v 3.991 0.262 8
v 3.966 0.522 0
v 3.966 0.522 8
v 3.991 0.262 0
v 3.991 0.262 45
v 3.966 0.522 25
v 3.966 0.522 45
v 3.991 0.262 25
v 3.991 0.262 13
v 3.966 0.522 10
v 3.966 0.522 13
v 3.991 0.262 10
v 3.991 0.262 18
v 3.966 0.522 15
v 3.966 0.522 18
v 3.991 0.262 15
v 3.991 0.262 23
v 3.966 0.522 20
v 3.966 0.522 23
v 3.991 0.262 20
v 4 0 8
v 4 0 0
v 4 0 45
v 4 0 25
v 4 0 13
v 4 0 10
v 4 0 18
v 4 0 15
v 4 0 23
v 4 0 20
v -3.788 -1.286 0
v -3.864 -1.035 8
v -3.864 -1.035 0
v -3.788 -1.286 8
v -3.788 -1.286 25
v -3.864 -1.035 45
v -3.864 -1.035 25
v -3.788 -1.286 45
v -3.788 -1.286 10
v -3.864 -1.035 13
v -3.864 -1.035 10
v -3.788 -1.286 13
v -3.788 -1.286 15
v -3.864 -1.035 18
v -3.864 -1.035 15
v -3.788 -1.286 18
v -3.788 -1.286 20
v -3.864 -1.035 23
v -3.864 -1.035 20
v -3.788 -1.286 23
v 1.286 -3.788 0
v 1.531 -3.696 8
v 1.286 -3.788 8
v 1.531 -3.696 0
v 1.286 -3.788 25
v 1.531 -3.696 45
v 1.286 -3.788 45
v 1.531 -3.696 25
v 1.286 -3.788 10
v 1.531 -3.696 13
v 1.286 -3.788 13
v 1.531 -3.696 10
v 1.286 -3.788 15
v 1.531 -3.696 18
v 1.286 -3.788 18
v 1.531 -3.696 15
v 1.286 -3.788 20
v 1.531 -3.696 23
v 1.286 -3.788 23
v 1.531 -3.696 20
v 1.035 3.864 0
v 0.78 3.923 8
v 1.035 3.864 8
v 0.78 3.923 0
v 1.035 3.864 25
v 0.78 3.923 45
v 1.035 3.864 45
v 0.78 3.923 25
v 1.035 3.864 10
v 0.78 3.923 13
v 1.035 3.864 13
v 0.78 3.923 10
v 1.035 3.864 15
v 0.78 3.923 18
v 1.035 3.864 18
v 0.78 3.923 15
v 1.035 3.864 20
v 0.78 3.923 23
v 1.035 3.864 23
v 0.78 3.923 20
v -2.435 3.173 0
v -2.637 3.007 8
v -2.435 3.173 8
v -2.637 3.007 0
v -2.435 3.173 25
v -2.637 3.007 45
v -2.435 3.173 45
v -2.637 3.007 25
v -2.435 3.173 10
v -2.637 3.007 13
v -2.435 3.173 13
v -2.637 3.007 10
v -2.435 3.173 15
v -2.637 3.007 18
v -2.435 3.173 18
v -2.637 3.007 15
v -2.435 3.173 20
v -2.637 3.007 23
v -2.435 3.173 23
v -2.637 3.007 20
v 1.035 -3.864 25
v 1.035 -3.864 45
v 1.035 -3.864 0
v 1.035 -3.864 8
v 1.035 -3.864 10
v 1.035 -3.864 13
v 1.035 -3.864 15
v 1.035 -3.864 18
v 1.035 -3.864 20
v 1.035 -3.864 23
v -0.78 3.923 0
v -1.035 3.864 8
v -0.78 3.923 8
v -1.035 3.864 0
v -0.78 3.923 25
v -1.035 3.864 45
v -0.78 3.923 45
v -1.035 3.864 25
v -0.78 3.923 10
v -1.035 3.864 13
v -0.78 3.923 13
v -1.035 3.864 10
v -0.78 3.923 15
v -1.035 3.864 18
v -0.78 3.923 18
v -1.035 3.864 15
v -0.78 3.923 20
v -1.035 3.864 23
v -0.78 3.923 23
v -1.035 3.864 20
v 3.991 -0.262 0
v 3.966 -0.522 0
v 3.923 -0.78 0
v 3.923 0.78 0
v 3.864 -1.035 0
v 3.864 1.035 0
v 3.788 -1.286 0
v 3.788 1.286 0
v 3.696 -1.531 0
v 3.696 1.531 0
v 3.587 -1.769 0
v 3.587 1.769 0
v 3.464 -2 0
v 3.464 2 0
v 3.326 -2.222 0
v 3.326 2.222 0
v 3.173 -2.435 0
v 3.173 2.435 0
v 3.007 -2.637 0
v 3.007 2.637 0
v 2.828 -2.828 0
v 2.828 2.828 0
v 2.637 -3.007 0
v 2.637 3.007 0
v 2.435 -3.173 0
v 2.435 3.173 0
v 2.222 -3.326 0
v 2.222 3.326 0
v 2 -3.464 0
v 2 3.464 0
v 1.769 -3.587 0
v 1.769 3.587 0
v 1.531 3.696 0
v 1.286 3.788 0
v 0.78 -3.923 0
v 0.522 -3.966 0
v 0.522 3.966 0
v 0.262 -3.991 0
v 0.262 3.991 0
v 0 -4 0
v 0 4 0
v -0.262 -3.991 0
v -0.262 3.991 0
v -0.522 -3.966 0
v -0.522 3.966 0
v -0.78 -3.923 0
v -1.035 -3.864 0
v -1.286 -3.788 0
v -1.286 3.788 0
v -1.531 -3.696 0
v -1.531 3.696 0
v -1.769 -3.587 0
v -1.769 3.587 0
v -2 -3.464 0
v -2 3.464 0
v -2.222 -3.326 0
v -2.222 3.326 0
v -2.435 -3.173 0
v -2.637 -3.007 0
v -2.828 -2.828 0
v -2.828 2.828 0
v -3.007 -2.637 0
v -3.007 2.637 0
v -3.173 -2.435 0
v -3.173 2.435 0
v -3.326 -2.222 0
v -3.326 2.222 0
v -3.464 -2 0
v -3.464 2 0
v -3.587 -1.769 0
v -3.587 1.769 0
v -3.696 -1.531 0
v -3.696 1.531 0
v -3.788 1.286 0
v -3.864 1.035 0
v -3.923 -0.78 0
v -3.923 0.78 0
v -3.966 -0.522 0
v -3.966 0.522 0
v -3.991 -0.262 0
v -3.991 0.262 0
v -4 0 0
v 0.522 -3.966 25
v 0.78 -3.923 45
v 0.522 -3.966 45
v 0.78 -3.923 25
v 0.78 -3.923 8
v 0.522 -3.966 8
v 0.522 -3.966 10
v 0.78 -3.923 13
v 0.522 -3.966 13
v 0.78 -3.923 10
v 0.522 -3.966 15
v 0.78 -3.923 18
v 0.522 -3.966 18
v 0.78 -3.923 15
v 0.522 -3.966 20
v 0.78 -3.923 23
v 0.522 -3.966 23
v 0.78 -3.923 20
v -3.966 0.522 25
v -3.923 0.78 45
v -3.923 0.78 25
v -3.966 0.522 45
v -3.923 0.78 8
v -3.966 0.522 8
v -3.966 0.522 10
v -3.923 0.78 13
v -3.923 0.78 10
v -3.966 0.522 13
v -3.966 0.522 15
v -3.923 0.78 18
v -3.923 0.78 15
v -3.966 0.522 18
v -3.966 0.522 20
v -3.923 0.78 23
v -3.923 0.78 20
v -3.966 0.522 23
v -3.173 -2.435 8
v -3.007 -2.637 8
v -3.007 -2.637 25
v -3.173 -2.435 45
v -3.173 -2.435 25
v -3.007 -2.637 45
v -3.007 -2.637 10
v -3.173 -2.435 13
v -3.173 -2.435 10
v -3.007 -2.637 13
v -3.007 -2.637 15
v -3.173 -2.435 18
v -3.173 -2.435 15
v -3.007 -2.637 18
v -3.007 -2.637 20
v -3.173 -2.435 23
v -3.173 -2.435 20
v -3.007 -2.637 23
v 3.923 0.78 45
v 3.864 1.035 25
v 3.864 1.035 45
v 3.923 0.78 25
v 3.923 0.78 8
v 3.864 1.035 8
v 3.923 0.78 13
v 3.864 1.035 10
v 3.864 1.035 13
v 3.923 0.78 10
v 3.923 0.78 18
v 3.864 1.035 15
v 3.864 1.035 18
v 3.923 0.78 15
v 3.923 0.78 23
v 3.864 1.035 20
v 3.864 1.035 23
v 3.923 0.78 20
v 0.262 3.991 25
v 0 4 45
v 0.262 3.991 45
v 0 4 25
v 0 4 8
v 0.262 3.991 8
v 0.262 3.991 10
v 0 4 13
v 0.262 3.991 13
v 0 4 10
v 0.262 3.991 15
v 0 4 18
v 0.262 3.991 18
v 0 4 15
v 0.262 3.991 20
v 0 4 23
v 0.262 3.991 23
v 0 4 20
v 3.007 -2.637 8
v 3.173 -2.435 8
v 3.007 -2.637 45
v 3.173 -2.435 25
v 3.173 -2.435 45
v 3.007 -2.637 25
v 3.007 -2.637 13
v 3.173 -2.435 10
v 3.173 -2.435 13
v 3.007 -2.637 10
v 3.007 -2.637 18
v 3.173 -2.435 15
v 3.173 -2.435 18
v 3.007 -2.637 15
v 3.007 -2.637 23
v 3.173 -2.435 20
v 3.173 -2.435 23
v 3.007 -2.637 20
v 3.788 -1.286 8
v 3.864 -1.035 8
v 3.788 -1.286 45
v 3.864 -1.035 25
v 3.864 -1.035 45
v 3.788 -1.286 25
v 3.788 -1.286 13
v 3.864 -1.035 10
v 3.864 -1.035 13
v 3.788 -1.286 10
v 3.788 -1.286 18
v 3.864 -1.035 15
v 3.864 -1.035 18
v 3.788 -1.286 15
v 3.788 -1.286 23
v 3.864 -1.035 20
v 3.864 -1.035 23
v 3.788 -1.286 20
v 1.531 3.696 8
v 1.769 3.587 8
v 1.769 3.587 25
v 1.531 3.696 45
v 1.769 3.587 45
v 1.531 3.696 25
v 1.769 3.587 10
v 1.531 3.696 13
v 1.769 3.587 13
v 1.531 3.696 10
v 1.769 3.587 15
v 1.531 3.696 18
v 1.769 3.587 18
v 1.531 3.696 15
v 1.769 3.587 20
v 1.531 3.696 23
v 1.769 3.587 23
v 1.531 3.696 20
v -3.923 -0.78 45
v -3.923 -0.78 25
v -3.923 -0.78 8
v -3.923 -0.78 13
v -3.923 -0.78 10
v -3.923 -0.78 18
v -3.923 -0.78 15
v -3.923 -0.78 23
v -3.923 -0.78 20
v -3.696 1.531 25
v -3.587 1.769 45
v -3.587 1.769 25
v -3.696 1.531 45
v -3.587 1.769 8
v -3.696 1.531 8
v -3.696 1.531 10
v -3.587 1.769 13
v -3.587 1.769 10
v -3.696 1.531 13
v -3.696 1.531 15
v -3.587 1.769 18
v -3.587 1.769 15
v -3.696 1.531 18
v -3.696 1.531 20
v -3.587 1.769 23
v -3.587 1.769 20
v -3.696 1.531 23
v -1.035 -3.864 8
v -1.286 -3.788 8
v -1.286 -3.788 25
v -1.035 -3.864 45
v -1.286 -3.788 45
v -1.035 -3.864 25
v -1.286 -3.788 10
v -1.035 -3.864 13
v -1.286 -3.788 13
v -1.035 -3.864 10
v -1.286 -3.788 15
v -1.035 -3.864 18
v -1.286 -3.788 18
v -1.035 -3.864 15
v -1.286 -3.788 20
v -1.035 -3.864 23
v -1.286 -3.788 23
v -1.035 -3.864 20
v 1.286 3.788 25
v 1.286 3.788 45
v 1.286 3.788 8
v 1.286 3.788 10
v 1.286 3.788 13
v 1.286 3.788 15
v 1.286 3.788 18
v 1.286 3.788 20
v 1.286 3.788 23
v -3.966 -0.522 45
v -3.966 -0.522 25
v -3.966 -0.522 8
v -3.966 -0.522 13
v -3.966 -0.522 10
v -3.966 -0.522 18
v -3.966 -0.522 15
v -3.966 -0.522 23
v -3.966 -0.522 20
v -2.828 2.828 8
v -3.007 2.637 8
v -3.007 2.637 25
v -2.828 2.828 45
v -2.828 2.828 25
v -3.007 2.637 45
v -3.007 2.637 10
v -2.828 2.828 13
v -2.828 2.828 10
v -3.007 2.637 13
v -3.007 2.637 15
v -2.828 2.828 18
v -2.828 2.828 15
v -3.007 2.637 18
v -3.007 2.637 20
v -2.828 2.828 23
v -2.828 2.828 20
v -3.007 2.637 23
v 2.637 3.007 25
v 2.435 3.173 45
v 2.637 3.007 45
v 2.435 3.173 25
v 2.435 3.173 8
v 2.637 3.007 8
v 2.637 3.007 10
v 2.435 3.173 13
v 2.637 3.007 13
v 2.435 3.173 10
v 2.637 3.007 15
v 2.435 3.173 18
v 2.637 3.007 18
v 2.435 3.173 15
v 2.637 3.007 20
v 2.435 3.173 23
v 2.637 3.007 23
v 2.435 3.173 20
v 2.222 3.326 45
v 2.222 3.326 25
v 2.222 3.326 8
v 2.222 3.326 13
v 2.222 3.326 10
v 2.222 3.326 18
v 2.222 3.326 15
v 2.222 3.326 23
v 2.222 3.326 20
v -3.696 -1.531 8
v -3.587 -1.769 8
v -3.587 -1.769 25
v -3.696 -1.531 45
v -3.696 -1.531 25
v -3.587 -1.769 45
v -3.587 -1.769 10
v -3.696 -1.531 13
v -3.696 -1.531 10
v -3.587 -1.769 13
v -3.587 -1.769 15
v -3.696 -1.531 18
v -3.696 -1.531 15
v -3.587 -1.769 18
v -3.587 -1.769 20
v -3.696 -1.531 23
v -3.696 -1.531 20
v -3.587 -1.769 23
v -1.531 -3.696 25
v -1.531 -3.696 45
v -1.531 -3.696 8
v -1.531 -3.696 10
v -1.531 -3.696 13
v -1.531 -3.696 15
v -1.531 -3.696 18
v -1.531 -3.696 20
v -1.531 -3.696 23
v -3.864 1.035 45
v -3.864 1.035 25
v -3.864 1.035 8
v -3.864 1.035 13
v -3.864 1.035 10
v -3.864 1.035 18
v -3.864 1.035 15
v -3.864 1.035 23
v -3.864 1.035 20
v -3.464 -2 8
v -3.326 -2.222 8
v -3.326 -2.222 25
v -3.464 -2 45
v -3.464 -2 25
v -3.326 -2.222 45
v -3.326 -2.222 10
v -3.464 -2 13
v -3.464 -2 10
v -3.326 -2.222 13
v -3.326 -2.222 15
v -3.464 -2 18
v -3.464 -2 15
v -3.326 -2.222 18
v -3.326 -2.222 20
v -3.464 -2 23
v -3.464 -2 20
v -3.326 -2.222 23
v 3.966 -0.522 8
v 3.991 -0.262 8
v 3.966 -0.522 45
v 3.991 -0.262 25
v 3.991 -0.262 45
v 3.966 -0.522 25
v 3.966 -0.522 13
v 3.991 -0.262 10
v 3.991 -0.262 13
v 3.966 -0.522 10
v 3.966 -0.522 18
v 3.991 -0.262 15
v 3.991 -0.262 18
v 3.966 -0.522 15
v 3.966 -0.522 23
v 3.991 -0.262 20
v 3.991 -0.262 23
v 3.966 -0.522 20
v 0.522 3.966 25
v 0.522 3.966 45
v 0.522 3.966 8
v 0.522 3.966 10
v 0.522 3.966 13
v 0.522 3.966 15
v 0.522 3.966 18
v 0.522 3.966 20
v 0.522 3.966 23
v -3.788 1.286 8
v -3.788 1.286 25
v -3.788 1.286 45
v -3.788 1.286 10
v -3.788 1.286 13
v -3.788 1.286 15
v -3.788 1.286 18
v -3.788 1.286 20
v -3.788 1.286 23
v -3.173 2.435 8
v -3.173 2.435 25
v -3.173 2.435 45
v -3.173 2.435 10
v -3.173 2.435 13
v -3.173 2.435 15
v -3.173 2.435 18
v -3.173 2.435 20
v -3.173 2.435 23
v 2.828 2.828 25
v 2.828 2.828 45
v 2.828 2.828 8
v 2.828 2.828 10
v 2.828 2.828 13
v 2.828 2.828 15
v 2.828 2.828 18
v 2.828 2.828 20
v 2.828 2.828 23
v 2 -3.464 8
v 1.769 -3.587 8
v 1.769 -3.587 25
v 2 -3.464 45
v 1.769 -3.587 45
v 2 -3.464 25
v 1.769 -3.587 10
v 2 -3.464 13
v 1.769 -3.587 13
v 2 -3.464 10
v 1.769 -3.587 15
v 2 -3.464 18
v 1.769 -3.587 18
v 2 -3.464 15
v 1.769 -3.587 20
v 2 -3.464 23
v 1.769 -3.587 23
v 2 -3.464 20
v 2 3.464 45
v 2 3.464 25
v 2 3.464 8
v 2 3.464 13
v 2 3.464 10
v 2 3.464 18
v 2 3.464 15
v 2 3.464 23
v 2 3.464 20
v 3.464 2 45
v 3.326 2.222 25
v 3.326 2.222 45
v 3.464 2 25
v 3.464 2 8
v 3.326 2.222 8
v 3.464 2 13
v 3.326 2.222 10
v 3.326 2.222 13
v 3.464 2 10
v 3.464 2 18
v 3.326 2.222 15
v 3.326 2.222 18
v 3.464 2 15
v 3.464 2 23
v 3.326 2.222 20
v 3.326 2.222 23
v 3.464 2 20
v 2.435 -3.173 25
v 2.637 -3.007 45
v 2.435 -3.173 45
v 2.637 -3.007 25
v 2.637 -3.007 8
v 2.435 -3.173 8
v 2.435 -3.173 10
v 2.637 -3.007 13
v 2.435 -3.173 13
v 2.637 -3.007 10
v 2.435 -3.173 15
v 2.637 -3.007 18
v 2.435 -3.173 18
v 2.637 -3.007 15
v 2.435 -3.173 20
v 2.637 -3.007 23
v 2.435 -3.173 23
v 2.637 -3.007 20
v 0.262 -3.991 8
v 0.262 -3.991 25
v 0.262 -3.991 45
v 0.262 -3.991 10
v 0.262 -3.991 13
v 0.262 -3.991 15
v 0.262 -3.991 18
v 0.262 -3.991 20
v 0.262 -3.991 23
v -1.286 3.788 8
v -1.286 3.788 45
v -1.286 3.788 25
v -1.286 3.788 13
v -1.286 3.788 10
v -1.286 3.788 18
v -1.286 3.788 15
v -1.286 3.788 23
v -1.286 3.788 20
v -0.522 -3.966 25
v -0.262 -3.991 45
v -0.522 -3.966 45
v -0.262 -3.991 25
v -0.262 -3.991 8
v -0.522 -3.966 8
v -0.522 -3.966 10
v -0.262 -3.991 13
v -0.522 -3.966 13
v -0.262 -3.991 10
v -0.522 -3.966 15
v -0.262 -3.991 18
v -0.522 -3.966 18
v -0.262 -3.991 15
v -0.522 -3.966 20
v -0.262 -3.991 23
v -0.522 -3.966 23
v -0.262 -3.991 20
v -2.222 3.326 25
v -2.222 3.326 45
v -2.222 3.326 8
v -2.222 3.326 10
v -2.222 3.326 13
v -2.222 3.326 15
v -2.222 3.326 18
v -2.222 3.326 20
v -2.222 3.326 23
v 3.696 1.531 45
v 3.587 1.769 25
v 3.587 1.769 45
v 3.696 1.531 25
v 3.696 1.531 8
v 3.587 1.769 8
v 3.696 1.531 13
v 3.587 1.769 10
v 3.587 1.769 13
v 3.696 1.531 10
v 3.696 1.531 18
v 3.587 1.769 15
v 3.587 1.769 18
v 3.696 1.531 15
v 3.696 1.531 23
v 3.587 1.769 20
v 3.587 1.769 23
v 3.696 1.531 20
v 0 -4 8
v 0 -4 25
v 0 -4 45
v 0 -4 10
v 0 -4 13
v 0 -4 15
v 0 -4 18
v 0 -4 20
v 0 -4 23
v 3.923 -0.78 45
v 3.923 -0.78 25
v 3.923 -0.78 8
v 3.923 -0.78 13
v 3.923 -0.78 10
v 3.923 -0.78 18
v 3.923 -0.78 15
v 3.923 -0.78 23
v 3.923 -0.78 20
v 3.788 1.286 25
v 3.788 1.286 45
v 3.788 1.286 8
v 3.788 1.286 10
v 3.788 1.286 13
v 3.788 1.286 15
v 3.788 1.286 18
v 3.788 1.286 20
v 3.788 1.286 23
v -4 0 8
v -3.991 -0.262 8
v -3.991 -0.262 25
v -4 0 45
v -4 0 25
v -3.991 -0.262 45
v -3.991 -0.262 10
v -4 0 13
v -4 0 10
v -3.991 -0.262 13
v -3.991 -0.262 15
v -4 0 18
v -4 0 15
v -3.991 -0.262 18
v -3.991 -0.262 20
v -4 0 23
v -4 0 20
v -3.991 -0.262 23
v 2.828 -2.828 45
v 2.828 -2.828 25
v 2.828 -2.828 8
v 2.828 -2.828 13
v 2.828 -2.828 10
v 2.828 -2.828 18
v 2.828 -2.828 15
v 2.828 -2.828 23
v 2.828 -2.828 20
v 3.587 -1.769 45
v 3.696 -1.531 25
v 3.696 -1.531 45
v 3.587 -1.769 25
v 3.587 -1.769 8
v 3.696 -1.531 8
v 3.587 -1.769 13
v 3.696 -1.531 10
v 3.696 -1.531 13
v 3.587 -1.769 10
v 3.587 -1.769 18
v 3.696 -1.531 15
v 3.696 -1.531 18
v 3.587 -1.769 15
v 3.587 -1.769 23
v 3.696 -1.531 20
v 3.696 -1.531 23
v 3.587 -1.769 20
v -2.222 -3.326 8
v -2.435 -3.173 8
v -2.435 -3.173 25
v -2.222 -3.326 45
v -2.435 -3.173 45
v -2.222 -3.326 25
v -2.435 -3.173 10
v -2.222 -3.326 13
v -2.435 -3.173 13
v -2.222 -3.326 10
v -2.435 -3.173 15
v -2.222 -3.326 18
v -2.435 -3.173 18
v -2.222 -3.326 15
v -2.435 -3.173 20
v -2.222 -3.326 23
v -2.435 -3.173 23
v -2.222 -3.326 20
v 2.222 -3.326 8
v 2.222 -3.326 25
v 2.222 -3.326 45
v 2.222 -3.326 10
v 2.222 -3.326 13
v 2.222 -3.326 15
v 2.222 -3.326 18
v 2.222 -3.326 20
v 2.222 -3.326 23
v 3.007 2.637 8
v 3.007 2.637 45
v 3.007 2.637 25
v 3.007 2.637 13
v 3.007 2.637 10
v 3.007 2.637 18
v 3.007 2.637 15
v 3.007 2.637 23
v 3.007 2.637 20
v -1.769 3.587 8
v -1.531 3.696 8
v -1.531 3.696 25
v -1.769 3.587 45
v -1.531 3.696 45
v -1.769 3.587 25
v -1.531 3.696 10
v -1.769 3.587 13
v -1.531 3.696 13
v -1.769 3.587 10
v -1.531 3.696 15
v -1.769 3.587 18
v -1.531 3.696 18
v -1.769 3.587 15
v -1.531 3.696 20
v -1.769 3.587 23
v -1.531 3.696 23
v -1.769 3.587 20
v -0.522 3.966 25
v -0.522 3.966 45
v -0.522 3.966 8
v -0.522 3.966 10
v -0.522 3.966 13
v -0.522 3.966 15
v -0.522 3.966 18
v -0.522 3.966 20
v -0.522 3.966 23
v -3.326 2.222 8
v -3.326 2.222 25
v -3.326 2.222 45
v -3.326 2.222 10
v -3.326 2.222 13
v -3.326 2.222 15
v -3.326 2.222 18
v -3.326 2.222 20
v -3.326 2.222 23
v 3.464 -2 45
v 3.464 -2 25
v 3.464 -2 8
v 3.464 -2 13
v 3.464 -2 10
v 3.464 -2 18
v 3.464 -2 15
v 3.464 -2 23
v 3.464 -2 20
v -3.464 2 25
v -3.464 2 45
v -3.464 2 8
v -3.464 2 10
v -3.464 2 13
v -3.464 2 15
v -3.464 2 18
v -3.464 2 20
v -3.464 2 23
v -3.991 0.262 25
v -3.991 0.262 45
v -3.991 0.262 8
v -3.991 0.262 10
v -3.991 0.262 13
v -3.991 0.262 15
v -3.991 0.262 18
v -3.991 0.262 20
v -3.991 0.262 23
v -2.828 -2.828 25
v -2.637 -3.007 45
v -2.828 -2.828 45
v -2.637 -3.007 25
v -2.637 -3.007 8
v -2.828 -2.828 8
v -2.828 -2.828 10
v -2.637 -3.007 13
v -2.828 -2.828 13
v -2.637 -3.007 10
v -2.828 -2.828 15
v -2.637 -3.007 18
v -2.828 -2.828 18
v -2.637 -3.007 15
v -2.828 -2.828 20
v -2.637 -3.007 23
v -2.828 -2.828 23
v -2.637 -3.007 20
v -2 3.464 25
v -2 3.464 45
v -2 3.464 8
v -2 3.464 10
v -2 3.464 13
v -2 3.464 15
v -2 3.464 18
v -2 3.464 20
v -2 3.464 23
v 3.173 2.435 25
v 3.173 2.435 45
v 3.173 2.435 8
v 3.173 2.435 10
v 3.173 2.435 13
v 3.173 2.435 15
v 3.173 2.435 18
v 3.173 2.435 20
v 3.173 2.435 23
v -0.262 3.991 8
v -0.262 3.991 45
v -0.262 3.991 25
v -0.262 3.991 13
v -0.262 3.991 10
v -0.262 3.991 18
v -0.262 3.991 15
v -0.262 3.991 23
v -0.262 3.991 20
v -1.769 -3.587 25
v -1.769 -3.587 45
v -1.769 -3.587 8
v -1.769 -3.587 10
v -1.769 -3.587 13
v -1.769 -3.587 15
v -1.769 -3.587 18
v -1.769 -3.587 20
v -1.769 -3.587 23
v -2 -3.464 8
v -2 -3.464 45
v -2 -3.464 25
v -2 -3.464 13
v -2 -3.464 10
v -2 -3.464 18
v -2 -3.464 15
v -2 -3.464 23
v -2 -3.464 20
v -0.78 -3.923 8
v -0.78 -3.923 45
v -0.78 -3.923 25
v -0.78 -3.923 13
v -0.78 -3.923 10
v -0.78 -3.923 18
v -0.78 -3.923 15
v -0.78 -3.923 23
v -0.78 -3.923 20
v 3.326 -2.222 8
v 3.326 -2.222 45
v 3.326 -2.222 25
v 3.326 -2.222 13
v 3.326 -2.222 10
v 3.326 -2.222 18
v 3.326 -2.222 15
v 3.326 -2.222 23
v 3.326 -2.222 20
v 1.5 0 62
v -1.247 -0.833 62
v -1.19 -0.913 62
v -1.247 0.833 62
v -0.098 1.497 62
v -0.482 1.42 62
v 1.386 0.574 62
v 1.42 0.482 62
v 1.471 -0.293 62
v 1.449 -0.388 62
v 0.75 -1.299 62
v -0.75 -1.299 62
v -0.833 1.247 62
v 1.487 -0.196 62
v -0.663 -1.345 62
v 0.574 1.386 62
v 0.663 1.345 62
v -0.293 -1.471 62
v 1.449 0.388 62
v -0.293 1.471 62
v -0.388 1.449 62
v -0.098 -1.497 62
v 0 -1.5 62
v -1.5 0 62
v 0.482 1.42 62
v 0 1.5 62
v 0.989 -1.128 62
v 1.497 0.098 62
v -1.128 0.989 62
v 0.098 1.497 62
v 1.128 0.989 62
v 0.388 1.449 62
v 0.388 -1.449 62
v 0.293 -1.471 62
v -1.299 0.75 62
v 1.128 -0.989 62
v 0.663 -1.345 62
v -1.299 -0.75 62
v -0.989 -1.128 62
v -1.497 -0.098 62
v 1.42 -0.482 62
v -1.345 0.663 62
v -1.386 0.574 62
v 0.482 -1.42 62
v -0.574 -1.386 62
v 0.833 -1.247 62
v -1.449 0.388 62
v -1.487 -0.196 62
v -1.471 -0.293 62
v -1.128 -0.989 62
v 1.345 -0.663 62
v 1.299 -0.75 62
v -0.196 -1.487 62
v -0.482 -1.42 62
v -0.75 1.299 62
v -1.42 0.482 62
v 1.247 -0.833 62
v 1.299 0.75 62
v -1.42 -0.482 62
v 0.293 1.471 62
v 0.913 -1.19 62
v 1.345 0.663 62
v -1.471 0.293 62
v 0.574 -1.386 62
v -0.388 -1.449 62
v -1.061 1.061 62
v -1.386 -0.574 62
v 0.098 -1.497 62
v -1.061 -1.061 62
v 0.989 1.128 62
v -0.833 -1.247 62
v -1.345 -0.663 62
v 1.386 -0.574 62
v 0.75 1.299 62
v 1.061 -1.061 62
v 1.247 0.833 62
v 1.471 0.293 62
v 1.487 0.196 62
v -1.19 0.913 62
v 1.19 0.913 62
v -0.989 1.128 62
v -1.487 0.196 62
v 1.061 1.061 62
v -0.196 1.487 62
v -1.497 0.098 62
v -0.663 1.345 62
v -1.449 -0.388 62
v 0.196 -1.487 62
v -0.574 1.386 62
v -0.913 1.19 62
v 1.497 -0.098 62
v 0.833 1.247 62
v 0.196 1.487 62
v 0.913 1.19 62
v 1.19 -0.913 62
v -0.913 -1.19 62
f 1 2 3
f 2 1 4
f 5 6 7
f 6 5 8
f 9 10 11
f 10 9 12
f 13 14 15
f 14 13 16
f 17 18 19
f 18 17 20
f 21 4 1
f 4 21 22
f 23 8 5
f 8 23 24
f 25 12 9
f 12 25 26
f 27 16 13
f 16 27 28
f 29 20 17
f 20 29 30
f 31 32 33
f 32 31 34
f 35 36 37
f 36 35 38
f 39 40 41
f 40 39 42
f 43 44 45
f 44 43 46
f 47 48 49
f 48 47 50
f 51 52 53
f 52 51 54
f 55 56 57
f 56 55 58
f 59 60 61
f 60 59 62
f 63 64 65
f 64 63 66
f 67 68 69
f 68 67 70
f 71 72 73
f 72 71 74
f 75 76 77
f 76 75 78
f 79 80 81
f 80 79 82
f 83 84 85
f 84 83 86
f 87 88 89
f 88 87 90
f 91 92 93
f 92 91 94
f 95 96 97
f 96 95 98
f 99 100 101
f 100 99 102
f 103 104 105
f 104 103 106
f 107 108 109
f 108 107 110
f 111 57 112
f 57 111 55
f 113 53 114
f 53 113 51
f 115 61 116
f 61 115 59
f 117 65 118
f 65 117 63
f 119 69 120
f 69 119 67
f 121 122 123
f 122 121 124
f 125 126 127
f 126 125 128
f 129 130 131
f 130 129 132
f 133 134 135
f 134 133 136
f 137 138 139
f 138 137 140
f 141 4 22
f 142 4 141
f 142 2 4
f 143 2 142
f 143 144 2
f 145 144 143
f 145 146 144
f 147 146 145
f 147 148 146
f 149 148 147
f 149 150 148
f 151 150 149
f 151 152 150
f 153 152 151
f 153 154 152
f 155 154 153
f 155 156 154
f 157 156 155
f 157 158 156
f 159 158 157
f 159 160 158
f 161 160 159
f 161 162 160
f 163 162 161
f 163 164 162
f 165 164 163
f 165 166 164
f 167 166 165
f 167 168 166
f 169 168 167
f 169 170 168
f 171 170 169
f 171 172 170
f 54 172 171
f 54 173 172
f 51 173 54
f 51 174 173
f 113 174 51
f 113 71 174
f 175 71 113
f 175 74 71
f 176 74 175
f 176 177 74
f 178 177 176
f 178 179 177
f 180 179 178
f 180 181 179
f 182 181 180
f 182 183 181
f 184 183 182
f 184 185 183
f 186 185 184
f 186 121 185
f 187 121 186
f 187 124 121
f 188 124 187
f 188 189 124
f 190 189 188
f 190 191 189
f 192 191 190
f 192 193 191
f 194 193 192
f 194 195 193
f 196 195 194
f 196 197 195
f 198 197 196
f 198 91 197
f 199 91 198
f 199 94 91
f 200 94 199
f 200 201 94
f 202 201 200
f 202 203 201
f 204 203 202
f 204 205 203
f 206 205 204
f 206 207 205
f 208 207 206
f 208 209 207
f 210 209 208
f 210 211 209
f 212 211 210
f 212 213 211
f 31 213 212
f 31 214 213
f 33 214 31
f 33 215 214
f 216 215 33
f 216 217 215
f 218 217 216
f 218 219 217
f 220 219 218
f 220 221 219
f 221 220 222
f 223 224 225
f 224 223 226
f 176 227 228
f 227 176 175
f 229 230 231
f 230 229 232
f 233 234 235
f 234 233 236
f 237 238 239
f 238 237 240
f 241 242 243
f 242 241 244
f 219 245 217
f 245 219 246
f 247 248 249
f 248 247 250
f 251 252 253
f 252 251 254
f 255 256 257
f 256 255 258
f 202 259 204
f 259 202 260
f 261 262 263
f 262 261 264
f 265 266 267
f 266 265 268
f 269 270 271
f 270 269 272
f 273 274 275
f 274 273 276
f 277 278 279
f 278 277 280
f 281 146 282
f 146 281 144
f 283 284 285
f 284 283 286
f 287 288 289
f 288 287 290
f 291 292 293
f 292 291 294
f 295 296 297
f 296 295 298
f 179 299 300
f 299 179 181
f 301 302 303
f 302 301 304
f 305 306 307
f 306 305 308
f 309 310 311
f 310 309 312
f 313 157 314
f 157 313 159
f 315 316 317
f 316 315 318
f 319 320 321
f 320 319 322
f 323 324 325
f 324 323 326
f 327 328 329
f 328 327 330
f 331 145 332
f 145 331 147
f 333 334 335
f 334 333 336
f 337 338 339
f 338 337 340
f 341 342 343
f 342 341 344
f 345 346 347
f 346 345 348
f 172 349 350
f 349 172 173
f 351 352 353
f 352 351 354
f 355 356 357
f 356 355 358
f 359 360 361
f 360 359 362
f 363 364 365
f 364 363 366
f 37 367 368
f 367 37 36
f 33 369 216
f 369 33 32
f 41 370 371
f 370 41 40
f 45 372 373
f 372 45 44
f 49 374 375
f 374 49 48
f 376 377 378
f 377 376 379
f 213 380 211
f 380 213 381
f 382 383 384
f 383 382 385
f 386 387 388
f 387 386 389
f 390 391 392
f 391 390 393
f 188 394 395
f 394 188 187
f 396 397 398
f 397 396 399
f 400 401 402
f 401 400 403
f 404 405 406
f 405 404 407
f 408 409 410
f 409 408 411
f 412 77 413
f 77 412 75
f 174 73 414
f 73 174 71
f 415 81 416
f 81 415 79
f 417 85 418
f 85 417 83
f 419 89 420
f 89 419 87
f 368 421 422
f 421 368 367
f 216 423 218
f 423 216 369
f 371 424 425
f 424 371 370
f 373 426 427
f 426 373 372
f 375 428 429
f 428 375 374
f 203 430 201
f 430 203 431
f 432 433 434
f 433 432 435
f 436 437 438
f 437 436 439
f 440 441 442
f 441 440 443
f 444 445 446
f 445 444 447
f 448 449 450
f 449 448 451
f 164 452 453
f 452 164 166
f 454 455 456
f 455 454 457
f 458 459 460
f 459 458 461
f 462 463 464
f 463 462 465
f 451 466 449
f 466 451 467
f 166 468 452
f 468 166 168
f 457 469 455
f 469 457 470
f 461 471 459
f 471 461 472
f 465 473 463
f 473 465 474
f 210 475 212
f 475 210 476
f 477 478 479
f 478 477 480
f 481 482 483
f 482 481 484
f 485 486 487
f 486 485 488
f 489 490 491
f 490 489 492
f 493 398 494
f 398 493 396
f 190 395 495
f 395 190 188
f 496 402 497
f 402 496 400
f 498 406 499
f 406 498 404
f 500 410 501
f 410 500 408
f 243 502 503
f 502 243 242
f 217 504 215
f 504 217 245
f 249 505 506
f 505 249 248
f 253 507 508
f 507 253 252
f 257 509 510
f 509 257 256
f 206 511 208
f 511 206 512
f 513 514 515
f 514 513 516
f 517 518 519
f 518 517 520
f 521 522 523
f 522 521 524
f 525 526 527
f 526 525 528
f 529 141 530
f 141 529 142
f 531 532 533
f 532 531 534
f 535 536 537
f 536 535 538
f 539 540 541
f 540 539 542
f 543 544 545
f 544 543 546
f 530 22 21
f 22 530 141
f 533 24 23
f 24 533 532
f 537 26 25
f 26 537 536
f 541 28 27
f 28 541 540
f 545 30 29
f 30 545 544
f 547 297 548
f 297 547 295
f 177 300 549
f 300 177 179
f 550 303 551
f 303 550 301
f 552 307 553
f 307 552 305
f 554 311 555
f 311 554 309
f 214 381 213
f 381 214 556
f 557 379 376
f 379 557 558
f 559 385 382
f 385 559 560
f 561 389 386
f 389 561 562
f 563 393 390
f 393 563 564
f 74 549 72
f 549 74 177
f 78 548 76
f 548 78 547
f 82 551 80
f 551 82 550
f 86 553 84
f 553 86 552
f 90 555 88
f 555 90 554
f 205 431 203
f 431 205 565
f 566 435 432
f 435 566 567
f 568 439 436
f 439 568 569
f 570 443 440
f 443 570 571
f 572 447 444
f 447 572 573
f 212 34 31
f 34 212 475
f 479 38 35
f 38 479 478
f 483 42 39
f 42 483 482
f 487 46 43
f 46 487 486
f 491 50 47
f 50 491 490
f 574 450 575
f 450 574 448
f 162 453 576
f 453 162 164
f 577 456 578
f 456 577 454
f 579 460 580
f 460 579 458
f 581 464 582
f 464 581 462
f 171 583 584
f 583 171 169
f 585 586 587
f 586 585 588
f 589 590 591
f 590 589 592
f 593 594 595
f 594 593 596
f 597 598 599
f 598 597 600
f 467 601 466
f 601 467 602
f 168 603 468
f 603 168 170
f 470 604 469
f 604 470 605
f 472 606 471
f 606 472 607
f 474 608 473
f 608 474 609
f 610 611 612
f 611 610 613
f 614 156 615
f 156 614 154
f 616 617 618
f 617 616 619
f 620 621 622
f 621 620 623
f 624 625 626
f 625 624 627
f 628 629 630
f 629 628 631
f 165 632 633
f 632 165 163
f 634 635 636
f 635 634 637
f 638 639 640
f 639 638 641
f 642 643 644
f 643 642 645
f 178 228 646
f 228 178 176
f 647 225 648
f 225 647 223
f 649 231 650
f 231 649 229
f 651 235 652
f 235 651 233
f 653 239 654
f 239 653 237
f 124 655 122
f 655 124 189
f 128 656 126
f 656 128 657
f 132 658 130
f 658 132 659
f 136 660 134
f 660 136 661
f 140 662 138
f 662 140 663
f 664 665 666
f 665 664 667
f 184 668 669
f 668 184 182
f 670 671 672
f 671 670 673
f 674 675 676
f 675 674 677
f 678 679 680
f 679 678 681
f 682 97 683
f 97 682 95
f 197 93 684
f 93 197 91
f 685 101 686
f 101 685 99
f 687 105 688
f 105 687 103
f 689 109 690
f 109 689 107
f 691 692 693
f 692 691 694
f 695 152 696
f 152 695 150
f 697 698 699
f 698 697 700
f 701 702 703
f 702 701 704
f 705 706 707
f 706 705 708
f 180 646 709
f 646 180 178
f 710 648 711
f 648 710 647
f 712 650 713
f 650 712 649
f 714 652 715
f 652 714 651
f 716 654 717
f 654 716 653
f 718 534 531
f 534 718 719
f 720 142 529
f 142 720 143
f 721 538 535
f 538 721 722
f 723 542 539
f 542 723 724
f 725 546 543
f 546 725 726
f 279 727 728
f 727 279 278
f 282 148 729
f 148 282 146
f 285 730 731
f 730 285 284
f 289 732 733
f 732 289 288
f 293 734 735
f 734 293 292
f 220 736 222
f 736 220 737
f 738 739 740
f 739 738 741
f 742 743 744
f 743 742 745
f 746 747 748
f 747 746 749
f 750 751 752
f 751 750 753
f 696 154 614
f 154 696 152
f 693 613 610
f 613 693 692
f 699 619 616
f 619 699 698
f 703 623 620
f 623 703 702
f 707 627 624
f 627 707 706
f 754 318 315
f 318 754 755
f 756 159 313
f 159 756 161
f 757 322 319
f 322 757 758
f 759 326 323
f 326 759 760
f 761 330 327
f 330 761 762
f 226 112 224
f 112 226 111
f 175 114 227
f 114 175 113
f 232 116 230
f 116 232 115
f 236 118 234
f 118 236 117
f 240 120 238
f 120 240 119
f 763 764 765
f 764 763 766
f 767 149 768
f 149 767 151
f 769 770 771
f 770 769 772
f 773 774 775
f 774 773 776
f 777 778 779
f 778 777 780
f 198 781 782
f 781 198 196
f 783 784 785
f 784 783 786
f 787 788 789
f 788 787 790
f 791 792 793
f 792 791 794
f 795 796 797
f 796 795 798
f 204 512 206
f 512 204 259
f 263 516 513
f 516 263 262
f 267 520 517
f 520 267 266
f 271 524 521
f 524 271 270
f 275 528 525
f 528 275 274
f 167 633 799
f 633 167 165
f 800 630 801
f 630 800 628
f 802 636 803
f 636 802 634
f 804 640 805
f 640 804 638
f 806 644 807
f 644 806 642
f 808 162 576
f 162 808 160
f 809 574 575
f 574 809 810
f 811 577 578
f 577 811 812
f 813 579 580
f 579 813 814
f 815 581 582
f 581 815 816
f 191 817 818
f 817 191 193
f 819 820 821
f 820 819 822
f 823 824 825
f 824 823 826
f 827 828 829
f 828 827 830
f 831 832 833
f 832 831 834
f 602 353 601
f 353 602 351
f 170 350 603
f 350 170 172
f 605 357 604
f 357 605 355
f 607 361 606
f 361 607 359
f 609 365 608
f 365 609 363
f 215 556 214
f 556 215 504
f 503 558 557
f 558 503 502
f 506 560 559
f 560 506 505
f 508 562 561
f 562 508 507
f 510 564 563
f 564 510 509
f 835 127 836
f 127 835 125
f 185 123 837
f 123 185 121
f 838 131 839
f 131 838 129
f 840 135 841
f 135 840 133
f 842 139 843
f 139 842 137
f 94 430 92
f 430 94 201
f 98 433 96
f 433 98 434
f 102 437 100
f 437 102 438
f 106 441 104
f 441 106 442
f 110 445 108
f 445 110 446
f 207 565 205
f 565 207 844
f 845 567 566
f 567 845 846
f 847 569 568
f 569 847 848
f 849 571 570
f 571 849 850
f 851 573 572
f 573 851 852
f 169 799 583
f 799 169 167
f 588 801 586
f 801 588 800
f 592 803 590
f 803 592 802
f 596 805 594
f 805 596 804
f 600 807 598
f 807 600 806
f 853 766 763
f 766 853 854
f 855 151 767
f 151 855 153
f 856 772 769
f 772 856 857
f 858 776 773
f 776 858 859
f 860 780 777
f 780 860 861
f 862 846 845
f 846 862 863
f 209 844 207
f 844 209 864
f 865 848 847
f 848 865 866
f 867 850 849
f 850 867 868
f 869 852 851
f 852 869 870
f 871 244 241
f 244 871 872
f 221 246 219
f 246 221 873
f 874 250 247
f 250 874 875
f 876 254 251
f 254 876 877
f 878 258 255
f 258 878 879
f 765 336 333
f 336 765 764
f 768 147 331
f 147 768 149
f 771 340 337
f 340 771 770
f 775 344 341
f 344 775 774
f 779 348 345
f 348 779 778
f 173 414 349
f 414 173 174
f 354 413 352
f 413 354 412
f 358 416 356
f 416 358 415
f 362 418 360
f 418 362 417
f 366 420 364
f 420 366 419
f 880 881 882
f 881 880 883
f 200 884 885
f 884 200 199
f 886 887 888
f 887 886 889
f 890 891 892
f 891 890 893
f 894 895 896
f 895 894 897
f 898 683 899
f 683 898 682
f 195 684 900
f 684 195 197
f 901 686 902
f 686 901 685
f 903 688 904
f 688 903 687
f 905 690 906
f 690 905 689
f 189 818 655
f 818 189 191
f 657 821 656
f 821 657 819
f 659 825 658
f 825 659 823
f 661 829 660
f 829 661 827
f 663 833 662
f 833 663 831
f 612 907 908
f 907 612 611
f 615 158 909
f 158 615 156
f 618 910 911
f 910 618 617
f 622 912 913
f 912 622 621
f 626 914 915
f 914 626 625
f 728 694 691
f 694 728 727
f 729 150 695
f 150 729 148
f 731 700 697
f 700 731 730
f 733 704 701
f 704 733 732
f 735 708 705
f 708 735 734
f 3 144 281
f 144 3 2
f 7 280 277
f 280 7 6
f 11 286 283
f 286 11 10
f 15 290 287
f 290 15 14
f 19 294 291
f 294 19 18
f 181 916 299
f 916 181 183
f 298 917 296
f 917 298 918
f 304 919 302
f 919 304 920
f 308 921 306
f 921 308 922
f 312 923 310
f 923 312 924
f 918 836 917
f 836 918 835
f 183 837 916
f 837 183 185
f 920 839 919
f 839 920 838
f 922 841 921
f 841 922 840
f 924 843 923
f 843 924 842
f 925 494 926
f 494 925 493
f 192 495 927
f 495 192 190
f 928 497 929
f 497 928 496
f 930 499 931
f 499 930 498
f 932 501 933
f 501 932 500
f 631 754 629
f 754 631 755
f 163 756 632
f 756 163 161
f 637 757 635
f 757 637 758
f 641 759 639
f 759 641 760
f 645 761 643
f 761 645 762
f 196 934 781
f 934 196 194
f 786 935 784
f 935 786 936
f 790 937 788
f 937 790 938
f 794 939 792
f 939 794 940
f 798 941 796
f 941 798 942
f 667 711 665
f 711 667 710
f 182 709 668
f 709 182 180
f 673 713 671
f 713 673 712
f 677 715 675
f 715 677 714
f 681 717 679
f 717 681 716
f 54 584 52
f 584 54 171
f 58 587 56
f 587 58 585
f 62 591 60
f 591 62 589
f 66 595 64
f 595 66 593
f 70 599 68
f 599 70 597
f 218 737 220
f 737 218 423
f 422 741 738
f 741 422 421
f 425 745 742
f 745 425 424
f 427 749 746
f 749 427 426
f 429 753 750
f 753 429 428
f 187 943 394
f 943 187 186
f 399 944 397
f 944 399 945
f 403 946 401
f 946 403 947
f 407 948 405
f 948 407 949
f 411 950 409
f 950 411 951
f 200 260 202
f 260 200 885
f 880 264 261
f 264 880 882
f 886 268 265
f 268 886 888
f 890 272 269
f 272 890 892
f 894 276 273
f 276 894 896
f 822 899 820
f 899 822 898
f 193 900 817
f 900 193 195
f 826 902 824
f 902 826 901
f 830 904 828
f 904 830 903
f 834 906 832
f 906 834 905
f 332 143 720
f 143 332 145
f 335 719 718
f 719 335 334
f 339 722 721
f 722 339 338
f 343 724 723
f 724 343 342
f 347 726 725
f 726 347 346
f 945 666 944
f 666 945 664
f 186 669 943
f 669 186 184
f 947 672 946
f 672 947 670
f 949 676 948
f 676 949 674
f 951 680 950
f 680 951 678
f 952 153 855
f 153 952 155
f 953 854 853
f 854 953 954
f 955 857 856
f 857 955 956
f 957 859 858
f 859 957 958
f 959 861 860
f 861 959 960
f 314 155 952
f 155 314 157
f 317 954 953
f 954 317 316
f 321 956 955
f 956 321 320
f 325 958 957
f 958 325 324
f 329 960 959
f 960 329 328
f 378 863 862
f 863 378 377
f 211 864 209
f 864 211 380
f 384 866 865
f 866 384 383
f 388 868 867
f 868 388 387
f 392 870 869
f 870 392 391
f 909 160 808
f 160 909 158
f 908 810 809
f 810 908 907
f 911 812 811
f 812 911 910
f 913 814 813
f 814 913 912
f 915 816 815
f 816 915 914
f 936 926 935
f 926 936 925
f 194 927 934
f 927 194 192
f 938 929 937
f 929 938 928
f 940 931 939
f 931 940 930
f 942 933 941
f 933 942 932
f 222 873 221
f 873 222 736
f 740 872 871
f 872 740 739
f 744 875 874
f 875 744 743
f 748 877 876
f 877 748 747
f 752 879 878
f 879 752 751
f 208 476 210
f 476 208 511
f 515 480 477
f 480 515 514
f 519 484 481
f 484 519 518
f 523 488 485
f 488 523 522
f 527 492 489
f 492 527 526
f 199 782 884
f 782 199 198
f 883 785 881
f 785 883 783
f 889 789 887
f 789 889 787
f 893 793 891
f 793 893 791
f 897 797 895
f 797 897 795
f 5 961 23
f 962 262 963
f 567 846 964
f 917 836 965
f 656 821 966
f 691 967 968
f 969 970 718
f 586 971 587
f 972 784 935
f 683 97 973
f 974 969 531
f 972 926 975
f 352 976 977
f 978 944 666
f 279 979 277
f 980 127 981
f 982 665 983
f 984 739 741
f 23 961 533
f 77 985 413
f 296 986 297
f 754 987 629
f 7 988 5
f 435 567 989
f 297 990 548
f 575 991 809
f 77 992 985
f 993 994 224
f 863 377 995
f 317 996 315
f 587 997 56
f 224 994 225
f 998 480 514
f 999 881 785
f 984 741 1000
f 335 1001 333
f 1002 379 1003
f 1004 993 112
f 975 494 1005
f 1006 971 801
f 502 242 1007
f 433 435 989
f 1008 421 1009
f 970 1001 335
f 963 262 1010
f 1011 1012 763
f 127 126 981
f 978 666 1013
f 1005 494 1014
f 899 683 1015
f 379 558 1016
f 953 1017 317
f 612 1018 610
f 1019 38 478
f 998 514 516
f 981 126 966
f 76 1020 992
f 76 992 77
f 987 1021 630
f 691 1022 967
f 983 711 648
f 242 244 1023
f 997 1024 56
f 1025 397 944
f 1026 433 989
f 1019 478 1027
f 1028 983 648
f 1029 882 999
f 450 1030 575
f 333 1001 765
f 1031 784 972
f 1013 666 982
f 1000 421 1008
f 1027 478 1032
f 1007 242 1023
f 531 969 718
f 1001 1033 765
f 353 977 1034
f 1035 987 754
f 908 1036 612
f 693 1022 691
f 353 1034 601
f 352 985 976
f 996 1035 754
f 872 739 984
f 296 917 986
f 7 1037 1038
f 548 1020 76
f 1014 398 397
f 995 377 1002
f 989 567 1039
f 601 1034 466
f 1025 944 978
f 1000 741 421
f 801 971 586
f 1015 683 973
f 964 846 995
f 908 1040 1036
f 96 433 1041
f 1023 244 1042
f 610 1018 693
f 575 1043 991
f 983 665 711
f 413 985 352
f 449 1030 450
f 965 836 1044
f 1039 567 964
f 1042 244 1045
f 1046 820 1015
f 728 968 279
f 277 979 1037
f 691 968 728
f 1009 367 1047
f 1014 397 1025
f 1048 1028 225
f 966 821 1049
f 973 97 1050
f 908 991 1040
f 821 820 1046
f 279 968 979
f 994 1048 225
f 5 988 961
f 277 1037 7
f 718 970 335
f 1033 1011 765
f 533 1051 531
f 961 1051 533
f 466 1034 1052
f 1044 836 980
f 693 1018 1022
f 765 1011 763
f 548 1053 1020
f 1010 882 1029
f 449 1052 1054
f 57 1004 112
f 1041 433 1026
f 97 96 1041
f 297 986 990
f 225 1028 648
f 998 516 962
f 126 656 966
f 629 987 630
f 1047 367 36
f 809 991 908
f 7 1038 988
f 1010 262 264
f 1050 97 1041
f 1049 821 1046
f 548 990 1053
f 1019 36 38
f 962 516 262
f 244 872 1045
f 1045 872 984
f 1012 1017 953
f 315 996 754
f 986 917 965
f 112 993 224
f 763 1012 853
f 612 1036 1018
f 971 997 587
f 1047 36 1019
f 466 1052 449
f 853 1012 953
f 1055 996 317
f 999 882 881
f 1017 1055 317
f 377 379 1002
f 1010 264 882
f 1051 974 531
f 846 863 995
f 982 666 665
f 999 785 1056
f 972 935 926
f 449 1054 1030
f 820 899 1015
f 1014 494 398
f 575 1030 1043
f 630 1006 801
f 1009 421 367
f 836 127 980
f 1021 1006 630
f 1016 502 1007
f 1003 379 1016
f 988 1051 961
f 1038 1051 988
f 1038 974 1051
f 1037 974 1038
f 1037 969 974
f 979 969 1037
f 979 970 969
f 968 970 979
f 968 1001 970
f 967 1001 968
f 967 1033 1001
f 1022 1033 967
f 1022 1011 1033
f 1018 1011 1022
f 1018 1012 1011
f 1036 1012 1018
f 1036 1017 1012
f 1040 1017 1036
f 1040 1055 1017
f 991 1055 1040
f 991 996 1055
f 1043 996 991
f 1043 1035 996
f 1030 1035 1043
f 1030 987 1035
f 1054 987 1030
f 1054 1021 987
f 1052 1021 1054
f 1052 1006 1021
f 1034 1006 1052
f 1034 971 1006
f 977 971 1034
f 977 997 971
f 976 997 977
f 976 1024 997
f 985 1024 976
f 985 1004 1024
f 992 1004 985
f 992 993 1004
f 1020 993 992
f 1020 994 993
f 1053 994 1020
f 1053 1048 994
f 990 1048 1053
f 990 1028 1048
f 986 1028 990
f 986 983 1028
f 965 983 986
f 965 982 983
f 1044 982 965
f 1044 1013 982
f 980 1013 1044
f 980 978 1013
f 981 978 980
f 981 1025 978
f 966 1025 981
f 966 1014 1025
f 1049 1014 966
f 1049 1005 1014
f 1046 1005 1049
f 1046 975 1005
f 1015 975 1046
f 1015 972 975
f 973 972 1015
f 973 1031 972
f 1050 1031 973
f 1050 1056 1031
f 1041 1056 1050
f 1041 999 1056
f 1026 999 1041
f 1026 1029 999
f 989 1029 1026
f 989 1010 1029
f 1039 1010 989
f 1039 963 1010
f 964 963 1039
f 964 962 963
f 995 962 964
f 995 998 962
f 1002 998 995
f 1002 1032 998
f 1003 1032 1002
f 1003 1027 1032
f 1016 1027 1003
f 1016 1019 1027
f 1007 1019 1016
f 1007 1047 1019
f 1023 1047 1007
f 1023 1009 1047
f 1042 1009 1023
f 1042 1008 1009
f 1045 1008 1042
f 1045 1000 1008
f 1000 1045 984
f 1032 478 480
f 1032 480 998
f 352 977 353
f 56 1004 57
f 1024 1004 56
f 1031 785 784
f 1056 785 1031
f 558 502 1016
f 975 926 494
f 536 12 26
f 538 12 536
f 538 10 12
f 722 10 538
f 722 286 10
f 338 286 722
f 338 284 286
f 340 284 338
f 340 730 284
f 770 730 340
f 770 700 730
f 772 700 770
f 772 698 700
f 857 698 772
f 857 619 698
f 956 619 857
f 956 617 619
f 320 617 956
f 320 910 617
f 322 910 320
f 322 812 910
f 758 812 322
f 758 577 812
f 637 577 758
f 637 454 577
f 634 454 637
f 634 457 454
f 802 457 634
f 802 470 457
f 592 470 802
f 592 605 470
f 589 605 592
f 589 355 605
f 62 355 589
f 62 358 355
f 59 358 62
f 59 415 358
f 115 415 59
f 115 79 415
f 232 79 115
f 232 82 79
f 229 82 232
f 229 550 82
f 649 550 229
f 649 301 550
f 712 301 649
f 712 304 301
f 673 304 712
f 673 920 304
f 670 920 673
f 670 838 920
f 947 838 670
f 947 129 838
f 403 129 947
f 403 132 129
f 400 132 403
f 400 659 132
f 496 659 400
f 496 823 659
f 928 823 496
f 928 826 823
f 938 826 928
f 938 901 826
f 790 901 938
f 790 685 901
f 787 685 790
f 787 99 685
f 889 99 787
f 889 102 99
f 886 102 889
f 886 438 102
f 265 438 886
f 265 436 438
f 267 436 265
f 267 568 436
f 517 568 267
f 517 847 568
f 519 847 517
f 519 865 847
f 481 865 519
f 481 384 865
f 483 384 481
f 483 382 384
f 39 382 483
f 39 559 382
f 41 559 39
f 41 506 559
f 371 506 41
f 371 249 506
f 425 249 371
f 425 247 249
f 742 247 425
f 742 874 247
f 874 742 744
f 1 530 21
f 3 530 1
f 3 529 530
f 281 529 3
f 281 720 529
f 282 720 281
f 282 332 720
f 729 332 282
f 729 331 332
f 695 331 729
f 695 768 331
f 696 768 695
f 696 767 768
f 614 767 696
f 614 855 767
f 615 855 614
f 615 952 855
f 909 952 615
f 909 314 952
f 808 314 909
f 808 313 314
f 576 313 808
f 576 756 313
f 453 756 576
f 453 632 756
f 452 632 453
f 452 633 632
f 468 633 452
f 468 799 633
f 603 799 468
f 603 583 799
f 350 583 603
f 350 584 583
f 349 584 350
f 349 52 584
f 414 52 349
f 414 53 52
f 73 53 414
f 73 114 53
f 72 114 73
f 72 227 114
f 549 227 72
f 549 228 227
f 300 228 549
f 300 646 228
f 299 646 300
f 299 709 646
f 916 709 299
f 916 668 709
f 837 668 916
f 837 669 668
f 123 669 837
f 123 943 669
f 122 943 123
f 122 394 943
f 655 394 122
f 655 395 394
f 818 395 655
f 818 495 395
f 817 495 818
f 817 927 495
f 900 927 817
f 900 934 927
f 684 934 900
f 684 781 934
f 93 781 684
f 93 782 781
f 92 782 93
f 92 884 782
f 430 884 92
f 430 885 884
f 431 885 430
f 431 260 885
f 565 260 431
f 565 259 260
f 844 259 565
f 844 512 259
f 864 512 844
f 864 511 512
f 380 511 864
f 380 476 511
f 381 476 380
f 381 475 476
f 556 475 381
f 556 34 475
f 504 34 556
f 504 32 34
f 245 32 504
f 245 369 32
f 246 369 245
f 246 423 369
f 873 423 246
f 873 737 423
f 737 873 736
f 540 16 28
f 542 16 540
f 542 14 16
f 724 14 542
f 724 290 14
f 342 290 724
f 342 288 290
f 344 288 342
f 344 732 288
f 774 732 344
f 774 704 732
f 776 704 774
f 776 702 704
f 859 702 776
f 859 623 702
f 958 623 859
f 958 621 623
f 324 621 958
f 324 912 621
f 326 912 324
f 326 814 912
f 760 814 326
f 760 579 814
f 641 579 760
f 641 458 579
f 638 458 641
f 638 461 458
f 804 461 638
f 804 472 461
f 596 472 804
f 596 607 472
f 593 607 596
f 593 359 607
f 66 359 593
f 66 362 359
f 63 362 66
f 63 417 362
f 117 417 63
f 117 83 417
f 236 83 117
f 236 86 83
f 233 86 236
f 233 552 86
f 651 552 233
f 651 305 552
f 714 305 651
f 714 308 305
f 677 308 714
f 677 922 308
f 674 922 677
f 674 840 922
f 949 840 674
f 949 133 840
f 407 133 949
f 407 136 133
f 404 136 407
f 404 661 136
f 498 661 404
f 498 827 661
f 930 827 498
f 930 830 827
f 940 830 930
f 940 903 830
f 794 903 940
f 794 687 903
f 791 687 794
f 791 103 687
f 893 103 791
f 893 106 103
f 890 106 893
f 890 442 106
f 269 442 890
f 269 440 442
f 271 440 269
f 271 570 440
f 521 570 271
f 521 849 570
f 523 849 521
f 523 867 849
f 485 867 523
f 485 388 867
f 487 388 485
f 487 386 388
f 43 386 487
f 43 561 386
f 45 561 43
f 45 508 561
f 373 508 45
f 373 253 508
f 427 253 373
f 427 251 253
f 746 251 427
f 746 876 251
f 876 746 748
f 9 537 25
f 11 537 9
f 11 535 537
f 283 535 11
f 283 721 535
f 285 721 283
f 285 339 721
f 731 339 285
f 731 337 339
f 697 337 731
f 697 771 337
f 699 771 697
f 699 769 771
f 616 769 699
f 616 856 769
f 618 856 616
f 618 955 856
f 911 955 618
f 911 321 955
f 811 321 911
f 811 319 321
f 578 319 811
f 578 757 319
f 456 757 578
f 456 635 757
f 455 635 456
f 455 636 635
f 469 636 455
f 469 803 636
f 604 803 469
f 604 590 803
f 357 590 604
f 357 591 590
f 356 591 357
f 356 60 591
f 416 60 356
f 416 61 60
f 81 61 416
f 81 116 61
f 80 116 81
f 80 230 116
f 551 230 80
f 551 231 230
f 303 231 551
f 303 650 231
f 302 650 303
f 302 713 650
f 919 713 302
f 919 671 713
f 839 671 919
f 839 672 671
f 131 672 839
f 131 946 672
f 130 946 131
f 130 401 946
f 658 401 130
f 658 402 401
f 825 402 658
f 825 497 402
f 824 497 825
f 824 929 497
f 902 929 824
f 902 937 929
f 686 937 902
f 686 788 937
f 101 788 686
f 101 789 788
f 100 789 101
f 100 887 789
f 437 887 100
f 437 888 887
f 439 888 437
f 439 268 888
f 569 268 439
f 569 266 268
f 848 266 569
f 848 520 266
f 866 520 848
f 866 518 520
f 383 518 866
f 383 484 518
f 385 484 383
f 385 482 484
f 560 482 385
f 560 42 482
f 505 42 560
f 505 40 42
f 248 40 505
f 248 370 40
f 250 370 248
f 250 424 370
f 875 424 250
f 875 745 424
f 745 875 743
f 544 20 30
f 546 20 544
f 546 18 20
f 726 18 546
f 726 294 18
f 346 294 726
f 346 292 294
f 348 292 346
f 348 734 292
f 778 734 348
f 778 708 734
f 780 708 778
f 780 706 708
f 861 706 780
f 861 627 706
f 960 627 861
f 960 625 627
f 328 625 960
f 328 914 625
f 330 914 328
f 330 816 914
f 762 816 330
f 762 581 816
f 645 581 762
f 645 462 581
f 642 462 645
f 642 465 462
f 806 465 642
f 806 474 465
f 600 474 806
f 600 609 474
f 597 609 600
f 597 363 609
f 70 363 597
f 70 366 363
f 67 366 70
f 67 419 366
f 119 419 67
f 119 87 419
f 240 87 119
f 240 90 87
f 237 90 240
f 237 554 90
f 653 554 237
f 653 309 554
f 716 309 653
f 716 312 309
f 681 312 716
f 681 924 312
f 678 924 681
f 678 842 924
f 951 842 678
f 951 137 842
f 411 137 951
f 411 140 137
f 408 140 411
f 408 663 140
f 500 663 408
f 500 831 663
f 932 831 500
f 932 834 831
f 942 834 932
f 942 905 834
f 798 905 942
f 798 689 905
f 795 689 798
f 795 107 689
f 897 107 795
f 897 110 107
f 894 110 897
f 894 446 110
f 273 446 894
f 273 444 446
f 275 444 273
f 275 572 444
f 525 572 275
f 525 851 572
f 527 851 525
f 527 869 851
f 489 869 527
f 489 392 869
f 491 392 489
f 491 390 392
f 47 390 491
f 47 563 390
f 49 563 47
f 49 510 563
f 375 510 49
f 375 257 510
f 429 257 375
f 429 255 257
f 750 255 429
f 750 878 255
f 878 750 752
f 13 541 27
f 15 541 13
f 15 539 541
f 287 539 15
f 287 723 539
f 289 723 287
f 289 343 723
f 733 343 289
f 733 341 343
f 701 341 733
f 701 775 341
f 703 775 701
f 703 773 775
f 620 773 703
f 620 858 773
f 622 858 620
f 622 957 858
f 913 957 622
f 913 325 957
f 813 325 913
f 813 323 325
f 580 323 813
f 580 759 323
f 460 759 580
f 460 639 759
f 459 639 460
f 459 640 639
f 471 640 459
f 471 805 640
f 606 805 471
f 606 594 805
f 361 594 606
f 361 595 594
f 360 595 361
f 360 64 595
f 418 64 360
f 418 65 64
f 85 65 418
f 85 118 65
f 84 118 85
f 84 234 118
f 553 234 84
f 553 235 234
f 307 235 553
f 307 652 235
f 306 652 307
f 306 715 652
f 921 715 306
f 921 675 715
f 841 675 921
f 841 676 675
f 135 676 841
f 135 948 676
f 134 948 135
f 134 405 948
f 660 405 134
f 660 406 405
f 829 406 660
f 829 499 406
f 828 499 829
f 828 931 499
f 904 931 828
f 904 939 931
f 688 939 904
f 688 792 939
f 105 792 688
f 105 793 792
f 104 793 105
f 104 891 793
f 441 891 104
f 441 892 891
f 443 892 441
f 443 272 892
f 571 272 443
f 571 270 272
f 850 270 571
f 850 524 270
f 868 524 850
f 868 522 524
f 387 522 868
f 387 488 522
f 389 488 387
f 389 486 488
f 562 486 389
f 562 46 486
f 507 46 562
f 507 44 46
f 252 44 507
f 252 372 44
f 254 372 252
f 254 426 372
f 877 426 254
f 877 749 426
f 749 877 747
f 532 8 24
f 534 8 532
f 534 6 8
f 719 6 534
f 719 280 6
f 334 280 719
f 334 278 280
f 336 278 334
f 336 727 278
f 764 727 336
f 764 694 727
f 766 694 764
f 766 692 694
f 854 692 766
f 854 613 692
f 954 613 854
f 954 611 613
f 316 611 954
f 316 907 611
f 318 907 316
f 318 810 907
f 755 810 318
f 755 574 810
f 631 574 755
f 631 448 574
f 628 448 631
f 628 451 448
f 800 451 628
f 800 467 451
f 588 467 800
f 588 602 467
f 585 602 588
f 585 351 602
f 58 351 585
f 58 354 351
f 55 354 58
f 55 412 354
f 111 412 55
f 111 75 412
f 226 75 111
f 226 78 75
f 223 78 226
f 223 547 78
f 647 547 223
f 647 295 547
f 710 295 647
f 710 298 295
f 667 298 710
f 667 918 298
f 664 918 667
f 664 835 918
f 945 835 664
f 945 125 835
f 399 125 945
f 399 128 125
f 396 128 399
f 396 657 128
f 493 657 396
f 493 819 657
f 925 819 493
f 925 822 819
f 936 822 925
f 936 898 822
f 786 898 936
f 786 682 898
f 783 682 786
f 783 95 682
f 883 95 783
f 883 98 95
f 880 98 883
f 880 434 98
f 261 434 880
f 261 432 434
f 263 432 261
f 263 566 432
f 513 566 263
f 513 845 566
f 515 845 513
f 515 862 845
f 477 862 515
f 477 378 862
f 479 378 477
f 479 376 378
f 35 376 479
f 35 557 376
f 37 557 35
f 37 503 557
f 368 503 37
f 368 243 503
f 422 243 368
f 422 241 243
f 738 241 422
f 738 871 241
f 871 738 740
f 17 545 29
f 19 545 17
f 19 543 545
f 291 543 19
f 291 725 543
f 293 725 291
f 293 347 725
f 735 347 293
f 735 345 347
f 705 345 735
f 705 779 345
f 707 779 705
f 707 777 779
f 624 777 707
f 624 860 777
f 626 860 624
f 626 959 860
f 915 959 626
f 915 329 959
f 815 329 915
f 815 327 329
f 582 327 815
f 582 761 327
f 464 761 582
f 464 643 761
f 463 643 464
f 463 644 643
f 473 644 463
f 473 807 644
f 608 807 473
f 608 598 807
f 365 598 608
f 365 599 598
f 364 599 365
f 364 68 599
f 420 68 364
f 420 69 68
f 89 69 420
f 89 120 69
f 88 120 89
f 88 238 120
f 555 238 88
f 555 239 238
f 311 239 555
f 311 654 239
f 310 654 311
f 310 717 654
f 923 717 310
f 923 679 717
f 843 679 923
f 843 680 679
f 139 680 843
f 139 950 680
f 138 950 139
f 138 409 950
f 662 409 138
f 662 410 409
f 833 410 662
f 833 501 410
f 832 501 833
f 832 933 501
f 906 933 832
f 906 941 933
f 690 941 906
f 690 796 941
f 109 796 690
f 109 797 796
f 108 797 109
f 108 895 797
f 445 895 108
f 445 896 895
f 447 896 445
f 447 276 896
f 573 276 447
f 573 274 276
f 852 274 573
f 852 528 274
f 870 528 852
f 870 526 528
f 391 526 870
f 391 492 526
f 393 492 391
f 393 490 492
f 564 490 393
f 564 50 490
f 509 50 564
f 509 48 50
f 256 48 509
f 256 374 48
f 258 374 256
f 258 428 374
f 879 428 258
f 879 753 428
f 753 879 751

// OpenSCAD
// Tissue-pestle for 1.5 mL microcentrifuge tubes
// Print orientation: standing upright on the bed (z = 0)

// ---------------- Parameters ----------------
handle_d      = 8;    // handle diameter (mm)
handle_h      = 45;   // handle height (mm), z = 0..45
cone_d_top    = 8;    // cone diameter at its base, same as handle (mm)
cone_d_tip    = 3;    // cone diameter at its tip (mm)
cone_top_z    = 45;   // cone base height (mm)
cone_tip_z    = 62;   // cone tip height (mm)
tip_d         = 3;    // rounded tip sphere diameter (mm)
tip_z         = 62;   // sphere centre height (mm)
groove_count  = 4;    // number of circumferential grip grooves
groove_w      = 2;    // groove width (mm), measured along Z
groove_depth  = 1;    // groove depth (mm), cut into the handle
cut_extra     = 0.5;  // overshoot of cutters past faces (mm)

$fn = 96;             // curve resolution

// ---------------- Model ----------------
difference() {
    union() {
        // (1) Cylindrical handle
        cylinder(d = handle_d, h = handle_h);

        // (2) Tapering cone: 8 mm at z = 45 down to 3 mm at z = 62
        translate([0, 0, cone_top_z])
            cylinder(d1 = cone_d_top, d2 = cone_d_tip, h = cone_tip_z - cone_top_z);

        // (3) Rounded tip: 3 mm sphere centred at z = 62
        translate([0, 0, tip_z - tip_d / 2])
            sphere(d = tip_d);
    }

    // Grip grooves, centred at z = 10, 15, 20, 25
    for (i = [0 : groove_count - 1]) {
        z_c = 10 + i * 5;
        translate([0, 0, z_c - groove_w / 2])
            cylinder(d = handle_d + 2 * cut_extra, h = groove_w, center = true);
    }
}
